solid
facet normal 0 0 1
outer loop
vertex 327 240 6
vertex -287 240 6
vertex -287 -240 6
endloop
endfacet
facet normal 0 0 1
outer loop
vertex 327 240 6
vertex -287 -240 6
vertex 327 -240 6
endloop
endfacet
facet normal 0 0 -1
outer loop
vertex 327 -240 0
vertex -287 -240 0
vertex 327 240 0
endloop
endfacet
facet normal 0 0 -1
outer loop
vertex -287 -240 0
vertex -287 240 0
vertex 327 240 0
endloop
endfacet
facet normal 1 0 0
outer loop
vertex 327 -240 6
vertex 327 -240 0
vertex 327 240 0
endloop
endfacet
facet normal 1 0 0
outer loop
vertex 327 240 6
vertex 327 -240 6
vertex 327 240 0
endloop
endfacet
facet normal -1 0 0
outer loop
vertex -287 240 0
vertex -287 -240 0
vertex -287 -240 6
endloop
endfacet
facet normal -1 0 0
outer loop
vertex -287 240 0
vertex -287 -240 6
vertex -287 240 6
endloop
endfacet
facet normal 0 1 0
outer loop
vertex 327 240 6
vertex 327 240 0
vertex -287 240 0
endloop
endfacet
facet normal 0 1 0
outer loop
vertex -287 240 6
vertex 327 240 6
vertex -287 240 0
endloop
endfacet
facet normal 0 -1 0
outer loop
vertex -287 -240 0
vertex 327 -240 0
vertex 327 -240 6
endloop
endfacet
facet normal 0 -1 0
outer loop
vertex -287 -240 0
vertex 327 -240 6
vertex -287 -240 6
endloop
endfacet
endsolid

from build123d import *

# Parameters (mm, degrees)
SKETCH1_W           = 700
SKETCH1_H           = 588
BOSS_EXTRUDE1_DEPTH = 6
FILLET1_R           = 20
SKETCH3_W           = 831.612655864
SKETCH3_H           = 634.364017828
SKETCH3_W_2         = 614
SKETCH3_H_2         = 480
CUT_EXTRUDE2_DEPTH  = 10


with BuildPart() as part:
    # Sketch1 → Boss-Extrude1 (new body)
    with BuildSketch(Plane.XY):
        Rectangle(SKETCH1_W, SKETCH1_H)
    extrude(amount=BOSS_EXTRUDE1_DEPTH)

    # Fillet1
    fillet1_edges = [part.edges().sort_by_distance(p)[0] for p in [
        (350, -294, 3),
        (-350, -294, 3),
        (-350, 294, 3),
        (350, 294, 3),
    ]]
    fillet(fillet1_edges, radius=FILLET1_R)

    # Sketch3 → Cut-Extrude2 (cut)
    with BuildSketch(Plane(origin=(0, 0, 0), x_dir=(-1, 0, 0), z_dir=(0, 0, -1))):
        with Locations((-20, 0)):
            Rectangle(SKETCH3_W, SKETCH3_H)
        with Locations((-20, 0)):
            Rectangle(SKETCH3_W_2, SKETCH3_H_2, mode=Mode.SUBTRACT)
    extrude(amount=-CUT_EXTRUDE2_DEPTH, mode=Mode.SUBTRACT)


solid = part.part
